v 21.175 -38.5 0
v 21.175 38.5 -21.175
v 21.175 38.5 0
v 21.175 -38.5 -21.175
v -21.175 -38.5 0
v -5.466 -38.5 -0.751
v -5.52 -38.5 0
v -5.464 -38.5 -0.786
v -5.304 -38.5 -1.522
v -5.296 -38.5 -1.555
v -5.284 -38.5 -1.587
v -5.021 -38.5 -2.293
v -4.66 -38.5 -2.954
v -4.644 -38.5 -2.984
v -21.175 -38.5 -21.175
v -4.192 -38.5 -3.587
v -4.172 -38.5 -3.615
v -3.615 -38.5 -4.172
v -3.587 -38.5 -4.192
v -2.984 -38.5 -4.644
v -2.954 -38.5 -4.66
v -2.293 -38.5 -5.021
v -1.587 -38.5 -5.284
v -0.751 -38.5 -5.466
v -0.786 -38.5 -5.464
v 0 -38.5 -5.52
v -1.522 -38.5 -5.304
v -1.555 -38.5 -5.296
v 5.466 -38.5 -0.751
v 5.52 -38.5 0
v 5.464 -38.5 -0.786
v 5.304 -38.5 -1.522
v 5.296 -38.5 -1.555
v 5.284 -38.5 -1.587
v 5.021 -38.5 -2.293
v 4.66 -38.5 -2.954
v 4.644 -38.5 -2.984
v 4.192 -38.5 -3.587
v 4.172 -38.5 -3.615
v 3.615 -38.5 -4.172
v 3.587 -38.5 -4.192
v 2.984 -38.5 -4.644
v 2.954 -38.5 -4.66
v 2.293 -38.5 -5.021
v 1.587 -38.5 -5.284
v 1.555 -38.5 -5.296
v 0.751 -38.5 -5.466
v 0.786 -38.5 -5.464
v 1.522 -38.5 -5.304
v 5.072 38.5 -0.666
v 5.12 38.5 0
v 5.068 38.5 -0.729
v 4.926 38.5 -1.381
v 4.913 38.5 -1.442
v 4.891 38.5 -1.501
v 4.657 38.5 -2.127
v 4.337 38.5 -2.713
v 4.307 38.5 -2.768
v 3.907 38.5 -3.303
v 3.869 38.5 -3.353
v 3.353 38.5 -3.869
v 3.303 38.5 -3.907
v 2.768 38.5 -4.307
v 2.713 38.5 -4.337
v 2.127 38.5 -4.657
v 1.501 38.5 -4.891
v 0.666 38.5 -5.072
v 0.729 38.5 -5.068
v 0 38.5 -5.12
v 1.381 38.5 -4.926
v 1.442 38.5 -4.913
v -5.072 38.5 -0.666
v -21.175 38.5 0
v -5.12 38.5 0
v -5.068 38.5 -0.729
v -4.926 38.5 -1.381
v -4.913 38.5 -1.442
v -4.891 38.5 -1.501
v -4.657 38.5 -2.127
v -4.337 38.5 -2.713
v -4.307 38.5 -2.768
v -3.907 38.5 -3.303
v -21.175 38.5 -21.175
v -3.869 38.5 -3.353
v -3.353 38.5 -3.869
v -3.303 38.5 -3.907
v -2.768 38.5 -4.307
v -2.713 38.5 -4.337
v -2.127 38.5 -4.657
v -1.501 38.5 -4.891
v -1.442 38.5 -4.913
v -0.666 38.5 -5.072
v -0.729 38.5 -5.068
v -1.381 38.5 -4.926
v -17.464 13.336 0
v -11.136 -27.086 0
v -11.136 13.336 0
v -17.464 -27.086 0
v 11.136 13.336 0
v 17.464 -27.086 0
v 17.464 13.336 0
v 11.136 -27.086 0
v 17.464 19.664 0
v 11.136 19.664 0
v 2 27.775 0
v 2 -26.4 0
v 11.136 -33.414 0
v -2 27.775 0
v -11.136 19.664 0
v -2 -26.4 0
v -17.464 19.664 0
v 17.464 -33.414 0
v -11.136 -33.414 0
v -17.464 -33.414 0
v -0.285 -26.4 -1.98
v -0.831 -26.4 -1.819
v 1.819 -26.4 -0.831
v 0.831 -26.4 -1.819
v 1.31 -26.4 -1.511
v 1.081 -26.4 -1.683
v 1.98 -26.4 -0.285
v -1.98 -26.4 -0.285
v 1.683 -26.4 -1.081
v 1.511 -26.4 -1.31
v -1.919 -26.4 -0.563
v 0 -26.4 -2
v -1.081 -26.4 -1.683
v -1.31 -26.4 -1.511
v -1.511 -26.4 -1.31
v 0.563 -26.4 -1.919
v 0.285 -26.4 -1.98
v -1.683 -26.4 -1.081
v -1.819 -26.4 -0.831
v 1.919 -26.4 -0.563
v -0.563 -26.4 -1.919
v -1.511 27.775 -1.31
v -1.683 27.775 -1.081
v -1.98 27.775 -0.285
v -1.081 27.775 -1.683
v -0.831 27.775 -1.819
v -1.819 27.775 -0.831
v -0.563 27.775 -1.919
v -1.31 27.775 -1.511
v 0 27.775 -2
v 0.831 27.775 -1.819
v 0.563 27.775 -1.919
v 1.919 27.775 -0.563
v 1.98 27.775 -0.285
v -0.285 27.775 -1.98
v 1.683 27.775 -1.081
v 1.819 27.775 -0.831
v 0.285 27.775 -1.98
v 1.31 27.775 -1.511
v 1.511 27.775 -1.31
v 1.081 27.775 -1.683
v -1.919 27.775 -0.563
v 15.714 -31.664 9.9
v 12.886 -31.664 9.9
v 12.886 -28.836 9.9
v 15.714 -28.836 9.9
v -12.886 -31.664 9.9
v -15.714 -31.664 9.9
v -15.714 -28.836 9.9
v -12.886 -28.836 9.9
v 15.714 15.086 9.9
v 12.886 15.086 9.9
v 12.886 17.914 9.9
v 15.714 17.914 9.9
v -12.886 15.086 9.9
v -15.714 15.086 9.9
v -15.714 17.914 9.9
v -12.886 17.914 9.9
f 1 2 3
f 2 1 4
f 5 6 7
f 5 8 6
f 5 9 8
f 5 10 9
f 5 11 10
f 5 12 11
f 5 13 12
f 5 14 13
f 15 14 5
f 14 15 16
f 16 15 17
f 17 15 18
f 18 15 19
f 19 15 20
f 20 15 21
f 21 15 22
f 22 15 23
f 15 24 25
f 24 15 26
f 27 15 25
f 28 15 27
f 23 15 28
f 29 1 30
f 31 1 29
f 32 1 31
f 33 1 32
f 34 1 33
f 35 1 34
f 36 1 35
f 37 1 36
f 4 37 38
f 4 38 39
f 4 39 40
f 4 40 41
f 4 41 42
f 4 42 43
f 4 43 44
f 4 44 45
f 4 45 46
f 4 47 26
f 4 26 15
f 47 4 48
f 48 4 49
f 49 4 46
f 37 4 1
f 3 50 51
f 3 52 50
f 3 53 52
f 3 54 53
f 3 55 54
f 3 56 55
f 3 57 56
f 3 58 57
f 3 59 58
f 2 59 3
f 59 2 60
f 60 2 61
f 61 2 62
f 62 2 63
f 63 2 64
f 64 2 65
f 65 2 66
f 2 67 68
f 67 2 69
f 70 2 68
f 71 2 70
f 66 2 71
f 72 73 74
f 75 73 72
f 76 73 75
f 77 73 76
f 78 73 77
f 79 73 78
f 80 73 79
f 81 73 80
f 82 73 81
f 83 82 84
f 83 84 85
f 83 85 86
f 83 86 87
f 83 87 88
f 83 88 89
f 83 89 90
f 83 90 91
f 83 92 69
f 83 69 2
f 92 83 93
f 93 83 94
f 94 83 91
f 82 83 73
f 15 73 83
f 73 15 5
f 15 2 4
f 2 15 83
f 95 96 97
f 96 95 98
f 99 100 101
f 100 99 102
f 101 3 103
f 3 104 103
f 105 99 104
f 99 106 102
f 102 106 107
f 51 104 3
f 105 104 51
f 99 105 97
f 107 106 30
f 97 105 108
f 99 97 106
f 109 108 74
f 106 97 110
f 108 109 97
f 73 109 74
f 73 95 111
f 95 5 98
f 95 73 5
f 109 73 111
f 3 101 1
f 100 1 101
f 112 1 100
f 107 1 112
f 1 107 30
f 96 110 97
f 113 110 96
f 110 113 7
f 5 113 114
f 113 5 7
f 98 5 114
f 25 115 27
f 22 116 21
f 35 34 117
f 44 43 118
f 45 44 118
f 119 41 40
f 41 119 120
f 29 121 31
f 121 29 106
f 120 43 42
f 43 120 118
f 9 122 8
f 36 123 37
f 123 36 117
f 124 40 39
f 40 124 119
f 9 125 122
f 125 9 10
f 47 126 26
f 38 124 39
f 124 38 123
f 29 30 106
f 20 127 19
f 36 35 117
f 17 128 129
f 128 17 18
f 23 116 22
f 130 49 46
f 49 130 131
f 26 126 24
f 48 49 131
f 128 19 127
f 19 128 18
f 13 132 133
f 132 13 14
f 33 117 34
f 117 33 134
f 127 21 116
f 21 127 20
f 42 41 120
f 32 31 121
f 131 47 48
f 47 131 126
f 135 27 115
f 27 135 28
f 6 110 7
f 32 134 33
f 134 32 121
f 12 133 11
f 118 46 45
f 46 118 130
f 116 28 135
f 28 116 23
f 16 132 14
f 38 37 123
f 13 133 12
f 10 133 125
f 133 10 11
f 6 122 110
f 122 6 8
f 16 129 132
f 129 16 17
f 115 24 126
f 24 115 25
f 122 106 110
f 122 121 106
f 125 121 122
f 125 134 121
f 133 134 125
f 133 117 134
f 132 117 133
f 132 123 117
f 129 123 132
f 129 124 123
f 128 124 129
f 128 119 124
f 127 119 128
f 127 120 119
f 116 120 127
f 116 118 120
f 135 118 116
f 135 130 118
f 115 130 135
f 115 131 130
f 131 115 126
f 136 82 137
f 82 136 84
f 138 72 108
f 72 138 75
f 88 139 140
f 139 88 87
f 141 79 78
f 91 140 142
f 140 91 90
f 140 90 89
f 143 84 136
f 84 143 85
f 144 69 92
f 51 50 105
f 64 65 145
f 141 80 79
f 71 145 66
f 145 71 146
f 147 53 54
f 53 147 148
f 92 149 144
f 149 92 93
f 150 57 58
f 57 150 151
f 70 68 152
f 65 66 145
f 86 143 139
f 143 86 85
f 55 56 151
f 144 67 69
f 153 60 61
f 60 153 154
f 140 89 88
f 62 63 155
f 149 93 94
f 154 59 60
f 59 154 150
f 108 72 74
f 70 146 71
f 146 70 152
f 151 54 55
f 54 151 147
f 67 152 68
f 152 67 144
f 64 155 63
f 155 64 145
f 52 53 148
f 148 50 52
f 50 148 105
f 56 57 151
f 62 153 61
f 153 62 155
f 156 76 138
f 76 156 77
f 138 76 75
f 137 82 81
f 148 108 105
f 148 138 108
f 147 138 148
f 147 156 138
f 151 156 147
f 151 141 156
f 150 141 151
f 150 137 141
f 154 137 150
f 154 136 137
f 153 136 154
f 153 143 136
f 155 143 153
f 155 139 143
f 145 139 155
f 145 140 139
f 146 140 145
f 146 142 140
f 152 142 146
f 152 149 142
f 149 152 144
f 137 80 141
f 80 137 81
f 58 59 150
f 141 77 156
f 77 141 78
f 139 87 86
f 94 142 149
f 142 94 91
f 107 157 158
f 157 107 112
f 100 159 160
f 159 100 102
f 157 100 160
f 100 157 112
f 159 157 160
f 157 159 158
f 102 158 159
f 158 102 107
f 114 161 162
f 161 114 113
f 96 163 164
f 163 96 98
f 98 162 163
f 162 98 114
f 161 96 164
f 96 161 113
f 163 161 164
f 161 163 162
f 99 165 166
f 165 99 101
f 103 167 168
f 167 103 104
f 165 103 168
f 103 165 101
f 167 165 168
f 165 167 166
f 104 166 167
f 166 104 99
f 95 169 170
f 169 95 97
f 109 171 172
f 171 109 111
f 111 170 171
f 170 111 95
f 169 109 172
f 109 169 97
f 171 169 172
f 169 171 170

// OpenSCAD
// Djed moule
version = 2; // 7.8 / 7.3

hauteur = 55;
margeMoule = 22;
hauteurPlotCentrage = 10;
dCylindreEvac = 4;

$fn=200;

// djed_creux();
// djed_ouvert();
// demi_djed_ouvert();
// bouchon();
rotate([90])
moule();

module moule(type="male") {
    difference() {
        // cylinder(h=hauteur+margeMoule, r=22, center=true, $fn=20);
        cube(size=[hauteur*0.37+margeMoule, hauteur*0.37+margeMoule, hauteur+margeMoule], center=true);
        //coupe
        translate([-hauteur, 0, -hauteur])
            cube(size=2*hauteur, center=false);

        translate([0,0,hauteur*0.08])
            djed(h=hauteur);

        // Evacuation
        translate([0,0,hauteur*0.48])
        cylinder(h=0.25*hauteur, d1=dCylindreEvac, d2=dCylindreEvac*3, center=false, $fn=44);
        translate([0,0,-hauteur*0.63])
        cylinder(h=0.25*hauteur, d2=dCylindreEvac, d1=dCylindreEvac*3, center=true, $fn=44);

        if (type != "male") {
            plots_centrage();
        }
    }
    if (type == "male") {
        plots_centrage(type);
    }
}

module plots_centrage(type) {
    translate([hauteur*0.26, 0, hauteur*0.55])
        _plot_centrage(type);
    translate([-hauteur*0.26, 0, hauteur*0.55])
        _plot_centrage(type);
    translate([hauteur*0.26, 0, -hauteur*0.3])
        _plot_centrage(type);
    translate([-hauteur*0.26, 0, -hauteur*0.3])
        _plot_centrage(type);
}

module _plot_centrage(type) {
    angle = type == "male" ? -90 : 90;
    d = type == "male" ? 0.1 : 0;
    translate([0, -d])
    rotate([angle]) rotate([0,0,45])
    cylinder(h=hauteurPlotCentrage, d1=9, d2=4, center=false, $fn=4);
}

module djed(h=160, angle=360) {
    s = h/160;
    scale([s, s, s])
    rotate_extrude(angle=angle, convexity = 10)
        sketch();
}


// sketch();
module sketch() {
    import(file = "../Djed_v1.dxf");
}
